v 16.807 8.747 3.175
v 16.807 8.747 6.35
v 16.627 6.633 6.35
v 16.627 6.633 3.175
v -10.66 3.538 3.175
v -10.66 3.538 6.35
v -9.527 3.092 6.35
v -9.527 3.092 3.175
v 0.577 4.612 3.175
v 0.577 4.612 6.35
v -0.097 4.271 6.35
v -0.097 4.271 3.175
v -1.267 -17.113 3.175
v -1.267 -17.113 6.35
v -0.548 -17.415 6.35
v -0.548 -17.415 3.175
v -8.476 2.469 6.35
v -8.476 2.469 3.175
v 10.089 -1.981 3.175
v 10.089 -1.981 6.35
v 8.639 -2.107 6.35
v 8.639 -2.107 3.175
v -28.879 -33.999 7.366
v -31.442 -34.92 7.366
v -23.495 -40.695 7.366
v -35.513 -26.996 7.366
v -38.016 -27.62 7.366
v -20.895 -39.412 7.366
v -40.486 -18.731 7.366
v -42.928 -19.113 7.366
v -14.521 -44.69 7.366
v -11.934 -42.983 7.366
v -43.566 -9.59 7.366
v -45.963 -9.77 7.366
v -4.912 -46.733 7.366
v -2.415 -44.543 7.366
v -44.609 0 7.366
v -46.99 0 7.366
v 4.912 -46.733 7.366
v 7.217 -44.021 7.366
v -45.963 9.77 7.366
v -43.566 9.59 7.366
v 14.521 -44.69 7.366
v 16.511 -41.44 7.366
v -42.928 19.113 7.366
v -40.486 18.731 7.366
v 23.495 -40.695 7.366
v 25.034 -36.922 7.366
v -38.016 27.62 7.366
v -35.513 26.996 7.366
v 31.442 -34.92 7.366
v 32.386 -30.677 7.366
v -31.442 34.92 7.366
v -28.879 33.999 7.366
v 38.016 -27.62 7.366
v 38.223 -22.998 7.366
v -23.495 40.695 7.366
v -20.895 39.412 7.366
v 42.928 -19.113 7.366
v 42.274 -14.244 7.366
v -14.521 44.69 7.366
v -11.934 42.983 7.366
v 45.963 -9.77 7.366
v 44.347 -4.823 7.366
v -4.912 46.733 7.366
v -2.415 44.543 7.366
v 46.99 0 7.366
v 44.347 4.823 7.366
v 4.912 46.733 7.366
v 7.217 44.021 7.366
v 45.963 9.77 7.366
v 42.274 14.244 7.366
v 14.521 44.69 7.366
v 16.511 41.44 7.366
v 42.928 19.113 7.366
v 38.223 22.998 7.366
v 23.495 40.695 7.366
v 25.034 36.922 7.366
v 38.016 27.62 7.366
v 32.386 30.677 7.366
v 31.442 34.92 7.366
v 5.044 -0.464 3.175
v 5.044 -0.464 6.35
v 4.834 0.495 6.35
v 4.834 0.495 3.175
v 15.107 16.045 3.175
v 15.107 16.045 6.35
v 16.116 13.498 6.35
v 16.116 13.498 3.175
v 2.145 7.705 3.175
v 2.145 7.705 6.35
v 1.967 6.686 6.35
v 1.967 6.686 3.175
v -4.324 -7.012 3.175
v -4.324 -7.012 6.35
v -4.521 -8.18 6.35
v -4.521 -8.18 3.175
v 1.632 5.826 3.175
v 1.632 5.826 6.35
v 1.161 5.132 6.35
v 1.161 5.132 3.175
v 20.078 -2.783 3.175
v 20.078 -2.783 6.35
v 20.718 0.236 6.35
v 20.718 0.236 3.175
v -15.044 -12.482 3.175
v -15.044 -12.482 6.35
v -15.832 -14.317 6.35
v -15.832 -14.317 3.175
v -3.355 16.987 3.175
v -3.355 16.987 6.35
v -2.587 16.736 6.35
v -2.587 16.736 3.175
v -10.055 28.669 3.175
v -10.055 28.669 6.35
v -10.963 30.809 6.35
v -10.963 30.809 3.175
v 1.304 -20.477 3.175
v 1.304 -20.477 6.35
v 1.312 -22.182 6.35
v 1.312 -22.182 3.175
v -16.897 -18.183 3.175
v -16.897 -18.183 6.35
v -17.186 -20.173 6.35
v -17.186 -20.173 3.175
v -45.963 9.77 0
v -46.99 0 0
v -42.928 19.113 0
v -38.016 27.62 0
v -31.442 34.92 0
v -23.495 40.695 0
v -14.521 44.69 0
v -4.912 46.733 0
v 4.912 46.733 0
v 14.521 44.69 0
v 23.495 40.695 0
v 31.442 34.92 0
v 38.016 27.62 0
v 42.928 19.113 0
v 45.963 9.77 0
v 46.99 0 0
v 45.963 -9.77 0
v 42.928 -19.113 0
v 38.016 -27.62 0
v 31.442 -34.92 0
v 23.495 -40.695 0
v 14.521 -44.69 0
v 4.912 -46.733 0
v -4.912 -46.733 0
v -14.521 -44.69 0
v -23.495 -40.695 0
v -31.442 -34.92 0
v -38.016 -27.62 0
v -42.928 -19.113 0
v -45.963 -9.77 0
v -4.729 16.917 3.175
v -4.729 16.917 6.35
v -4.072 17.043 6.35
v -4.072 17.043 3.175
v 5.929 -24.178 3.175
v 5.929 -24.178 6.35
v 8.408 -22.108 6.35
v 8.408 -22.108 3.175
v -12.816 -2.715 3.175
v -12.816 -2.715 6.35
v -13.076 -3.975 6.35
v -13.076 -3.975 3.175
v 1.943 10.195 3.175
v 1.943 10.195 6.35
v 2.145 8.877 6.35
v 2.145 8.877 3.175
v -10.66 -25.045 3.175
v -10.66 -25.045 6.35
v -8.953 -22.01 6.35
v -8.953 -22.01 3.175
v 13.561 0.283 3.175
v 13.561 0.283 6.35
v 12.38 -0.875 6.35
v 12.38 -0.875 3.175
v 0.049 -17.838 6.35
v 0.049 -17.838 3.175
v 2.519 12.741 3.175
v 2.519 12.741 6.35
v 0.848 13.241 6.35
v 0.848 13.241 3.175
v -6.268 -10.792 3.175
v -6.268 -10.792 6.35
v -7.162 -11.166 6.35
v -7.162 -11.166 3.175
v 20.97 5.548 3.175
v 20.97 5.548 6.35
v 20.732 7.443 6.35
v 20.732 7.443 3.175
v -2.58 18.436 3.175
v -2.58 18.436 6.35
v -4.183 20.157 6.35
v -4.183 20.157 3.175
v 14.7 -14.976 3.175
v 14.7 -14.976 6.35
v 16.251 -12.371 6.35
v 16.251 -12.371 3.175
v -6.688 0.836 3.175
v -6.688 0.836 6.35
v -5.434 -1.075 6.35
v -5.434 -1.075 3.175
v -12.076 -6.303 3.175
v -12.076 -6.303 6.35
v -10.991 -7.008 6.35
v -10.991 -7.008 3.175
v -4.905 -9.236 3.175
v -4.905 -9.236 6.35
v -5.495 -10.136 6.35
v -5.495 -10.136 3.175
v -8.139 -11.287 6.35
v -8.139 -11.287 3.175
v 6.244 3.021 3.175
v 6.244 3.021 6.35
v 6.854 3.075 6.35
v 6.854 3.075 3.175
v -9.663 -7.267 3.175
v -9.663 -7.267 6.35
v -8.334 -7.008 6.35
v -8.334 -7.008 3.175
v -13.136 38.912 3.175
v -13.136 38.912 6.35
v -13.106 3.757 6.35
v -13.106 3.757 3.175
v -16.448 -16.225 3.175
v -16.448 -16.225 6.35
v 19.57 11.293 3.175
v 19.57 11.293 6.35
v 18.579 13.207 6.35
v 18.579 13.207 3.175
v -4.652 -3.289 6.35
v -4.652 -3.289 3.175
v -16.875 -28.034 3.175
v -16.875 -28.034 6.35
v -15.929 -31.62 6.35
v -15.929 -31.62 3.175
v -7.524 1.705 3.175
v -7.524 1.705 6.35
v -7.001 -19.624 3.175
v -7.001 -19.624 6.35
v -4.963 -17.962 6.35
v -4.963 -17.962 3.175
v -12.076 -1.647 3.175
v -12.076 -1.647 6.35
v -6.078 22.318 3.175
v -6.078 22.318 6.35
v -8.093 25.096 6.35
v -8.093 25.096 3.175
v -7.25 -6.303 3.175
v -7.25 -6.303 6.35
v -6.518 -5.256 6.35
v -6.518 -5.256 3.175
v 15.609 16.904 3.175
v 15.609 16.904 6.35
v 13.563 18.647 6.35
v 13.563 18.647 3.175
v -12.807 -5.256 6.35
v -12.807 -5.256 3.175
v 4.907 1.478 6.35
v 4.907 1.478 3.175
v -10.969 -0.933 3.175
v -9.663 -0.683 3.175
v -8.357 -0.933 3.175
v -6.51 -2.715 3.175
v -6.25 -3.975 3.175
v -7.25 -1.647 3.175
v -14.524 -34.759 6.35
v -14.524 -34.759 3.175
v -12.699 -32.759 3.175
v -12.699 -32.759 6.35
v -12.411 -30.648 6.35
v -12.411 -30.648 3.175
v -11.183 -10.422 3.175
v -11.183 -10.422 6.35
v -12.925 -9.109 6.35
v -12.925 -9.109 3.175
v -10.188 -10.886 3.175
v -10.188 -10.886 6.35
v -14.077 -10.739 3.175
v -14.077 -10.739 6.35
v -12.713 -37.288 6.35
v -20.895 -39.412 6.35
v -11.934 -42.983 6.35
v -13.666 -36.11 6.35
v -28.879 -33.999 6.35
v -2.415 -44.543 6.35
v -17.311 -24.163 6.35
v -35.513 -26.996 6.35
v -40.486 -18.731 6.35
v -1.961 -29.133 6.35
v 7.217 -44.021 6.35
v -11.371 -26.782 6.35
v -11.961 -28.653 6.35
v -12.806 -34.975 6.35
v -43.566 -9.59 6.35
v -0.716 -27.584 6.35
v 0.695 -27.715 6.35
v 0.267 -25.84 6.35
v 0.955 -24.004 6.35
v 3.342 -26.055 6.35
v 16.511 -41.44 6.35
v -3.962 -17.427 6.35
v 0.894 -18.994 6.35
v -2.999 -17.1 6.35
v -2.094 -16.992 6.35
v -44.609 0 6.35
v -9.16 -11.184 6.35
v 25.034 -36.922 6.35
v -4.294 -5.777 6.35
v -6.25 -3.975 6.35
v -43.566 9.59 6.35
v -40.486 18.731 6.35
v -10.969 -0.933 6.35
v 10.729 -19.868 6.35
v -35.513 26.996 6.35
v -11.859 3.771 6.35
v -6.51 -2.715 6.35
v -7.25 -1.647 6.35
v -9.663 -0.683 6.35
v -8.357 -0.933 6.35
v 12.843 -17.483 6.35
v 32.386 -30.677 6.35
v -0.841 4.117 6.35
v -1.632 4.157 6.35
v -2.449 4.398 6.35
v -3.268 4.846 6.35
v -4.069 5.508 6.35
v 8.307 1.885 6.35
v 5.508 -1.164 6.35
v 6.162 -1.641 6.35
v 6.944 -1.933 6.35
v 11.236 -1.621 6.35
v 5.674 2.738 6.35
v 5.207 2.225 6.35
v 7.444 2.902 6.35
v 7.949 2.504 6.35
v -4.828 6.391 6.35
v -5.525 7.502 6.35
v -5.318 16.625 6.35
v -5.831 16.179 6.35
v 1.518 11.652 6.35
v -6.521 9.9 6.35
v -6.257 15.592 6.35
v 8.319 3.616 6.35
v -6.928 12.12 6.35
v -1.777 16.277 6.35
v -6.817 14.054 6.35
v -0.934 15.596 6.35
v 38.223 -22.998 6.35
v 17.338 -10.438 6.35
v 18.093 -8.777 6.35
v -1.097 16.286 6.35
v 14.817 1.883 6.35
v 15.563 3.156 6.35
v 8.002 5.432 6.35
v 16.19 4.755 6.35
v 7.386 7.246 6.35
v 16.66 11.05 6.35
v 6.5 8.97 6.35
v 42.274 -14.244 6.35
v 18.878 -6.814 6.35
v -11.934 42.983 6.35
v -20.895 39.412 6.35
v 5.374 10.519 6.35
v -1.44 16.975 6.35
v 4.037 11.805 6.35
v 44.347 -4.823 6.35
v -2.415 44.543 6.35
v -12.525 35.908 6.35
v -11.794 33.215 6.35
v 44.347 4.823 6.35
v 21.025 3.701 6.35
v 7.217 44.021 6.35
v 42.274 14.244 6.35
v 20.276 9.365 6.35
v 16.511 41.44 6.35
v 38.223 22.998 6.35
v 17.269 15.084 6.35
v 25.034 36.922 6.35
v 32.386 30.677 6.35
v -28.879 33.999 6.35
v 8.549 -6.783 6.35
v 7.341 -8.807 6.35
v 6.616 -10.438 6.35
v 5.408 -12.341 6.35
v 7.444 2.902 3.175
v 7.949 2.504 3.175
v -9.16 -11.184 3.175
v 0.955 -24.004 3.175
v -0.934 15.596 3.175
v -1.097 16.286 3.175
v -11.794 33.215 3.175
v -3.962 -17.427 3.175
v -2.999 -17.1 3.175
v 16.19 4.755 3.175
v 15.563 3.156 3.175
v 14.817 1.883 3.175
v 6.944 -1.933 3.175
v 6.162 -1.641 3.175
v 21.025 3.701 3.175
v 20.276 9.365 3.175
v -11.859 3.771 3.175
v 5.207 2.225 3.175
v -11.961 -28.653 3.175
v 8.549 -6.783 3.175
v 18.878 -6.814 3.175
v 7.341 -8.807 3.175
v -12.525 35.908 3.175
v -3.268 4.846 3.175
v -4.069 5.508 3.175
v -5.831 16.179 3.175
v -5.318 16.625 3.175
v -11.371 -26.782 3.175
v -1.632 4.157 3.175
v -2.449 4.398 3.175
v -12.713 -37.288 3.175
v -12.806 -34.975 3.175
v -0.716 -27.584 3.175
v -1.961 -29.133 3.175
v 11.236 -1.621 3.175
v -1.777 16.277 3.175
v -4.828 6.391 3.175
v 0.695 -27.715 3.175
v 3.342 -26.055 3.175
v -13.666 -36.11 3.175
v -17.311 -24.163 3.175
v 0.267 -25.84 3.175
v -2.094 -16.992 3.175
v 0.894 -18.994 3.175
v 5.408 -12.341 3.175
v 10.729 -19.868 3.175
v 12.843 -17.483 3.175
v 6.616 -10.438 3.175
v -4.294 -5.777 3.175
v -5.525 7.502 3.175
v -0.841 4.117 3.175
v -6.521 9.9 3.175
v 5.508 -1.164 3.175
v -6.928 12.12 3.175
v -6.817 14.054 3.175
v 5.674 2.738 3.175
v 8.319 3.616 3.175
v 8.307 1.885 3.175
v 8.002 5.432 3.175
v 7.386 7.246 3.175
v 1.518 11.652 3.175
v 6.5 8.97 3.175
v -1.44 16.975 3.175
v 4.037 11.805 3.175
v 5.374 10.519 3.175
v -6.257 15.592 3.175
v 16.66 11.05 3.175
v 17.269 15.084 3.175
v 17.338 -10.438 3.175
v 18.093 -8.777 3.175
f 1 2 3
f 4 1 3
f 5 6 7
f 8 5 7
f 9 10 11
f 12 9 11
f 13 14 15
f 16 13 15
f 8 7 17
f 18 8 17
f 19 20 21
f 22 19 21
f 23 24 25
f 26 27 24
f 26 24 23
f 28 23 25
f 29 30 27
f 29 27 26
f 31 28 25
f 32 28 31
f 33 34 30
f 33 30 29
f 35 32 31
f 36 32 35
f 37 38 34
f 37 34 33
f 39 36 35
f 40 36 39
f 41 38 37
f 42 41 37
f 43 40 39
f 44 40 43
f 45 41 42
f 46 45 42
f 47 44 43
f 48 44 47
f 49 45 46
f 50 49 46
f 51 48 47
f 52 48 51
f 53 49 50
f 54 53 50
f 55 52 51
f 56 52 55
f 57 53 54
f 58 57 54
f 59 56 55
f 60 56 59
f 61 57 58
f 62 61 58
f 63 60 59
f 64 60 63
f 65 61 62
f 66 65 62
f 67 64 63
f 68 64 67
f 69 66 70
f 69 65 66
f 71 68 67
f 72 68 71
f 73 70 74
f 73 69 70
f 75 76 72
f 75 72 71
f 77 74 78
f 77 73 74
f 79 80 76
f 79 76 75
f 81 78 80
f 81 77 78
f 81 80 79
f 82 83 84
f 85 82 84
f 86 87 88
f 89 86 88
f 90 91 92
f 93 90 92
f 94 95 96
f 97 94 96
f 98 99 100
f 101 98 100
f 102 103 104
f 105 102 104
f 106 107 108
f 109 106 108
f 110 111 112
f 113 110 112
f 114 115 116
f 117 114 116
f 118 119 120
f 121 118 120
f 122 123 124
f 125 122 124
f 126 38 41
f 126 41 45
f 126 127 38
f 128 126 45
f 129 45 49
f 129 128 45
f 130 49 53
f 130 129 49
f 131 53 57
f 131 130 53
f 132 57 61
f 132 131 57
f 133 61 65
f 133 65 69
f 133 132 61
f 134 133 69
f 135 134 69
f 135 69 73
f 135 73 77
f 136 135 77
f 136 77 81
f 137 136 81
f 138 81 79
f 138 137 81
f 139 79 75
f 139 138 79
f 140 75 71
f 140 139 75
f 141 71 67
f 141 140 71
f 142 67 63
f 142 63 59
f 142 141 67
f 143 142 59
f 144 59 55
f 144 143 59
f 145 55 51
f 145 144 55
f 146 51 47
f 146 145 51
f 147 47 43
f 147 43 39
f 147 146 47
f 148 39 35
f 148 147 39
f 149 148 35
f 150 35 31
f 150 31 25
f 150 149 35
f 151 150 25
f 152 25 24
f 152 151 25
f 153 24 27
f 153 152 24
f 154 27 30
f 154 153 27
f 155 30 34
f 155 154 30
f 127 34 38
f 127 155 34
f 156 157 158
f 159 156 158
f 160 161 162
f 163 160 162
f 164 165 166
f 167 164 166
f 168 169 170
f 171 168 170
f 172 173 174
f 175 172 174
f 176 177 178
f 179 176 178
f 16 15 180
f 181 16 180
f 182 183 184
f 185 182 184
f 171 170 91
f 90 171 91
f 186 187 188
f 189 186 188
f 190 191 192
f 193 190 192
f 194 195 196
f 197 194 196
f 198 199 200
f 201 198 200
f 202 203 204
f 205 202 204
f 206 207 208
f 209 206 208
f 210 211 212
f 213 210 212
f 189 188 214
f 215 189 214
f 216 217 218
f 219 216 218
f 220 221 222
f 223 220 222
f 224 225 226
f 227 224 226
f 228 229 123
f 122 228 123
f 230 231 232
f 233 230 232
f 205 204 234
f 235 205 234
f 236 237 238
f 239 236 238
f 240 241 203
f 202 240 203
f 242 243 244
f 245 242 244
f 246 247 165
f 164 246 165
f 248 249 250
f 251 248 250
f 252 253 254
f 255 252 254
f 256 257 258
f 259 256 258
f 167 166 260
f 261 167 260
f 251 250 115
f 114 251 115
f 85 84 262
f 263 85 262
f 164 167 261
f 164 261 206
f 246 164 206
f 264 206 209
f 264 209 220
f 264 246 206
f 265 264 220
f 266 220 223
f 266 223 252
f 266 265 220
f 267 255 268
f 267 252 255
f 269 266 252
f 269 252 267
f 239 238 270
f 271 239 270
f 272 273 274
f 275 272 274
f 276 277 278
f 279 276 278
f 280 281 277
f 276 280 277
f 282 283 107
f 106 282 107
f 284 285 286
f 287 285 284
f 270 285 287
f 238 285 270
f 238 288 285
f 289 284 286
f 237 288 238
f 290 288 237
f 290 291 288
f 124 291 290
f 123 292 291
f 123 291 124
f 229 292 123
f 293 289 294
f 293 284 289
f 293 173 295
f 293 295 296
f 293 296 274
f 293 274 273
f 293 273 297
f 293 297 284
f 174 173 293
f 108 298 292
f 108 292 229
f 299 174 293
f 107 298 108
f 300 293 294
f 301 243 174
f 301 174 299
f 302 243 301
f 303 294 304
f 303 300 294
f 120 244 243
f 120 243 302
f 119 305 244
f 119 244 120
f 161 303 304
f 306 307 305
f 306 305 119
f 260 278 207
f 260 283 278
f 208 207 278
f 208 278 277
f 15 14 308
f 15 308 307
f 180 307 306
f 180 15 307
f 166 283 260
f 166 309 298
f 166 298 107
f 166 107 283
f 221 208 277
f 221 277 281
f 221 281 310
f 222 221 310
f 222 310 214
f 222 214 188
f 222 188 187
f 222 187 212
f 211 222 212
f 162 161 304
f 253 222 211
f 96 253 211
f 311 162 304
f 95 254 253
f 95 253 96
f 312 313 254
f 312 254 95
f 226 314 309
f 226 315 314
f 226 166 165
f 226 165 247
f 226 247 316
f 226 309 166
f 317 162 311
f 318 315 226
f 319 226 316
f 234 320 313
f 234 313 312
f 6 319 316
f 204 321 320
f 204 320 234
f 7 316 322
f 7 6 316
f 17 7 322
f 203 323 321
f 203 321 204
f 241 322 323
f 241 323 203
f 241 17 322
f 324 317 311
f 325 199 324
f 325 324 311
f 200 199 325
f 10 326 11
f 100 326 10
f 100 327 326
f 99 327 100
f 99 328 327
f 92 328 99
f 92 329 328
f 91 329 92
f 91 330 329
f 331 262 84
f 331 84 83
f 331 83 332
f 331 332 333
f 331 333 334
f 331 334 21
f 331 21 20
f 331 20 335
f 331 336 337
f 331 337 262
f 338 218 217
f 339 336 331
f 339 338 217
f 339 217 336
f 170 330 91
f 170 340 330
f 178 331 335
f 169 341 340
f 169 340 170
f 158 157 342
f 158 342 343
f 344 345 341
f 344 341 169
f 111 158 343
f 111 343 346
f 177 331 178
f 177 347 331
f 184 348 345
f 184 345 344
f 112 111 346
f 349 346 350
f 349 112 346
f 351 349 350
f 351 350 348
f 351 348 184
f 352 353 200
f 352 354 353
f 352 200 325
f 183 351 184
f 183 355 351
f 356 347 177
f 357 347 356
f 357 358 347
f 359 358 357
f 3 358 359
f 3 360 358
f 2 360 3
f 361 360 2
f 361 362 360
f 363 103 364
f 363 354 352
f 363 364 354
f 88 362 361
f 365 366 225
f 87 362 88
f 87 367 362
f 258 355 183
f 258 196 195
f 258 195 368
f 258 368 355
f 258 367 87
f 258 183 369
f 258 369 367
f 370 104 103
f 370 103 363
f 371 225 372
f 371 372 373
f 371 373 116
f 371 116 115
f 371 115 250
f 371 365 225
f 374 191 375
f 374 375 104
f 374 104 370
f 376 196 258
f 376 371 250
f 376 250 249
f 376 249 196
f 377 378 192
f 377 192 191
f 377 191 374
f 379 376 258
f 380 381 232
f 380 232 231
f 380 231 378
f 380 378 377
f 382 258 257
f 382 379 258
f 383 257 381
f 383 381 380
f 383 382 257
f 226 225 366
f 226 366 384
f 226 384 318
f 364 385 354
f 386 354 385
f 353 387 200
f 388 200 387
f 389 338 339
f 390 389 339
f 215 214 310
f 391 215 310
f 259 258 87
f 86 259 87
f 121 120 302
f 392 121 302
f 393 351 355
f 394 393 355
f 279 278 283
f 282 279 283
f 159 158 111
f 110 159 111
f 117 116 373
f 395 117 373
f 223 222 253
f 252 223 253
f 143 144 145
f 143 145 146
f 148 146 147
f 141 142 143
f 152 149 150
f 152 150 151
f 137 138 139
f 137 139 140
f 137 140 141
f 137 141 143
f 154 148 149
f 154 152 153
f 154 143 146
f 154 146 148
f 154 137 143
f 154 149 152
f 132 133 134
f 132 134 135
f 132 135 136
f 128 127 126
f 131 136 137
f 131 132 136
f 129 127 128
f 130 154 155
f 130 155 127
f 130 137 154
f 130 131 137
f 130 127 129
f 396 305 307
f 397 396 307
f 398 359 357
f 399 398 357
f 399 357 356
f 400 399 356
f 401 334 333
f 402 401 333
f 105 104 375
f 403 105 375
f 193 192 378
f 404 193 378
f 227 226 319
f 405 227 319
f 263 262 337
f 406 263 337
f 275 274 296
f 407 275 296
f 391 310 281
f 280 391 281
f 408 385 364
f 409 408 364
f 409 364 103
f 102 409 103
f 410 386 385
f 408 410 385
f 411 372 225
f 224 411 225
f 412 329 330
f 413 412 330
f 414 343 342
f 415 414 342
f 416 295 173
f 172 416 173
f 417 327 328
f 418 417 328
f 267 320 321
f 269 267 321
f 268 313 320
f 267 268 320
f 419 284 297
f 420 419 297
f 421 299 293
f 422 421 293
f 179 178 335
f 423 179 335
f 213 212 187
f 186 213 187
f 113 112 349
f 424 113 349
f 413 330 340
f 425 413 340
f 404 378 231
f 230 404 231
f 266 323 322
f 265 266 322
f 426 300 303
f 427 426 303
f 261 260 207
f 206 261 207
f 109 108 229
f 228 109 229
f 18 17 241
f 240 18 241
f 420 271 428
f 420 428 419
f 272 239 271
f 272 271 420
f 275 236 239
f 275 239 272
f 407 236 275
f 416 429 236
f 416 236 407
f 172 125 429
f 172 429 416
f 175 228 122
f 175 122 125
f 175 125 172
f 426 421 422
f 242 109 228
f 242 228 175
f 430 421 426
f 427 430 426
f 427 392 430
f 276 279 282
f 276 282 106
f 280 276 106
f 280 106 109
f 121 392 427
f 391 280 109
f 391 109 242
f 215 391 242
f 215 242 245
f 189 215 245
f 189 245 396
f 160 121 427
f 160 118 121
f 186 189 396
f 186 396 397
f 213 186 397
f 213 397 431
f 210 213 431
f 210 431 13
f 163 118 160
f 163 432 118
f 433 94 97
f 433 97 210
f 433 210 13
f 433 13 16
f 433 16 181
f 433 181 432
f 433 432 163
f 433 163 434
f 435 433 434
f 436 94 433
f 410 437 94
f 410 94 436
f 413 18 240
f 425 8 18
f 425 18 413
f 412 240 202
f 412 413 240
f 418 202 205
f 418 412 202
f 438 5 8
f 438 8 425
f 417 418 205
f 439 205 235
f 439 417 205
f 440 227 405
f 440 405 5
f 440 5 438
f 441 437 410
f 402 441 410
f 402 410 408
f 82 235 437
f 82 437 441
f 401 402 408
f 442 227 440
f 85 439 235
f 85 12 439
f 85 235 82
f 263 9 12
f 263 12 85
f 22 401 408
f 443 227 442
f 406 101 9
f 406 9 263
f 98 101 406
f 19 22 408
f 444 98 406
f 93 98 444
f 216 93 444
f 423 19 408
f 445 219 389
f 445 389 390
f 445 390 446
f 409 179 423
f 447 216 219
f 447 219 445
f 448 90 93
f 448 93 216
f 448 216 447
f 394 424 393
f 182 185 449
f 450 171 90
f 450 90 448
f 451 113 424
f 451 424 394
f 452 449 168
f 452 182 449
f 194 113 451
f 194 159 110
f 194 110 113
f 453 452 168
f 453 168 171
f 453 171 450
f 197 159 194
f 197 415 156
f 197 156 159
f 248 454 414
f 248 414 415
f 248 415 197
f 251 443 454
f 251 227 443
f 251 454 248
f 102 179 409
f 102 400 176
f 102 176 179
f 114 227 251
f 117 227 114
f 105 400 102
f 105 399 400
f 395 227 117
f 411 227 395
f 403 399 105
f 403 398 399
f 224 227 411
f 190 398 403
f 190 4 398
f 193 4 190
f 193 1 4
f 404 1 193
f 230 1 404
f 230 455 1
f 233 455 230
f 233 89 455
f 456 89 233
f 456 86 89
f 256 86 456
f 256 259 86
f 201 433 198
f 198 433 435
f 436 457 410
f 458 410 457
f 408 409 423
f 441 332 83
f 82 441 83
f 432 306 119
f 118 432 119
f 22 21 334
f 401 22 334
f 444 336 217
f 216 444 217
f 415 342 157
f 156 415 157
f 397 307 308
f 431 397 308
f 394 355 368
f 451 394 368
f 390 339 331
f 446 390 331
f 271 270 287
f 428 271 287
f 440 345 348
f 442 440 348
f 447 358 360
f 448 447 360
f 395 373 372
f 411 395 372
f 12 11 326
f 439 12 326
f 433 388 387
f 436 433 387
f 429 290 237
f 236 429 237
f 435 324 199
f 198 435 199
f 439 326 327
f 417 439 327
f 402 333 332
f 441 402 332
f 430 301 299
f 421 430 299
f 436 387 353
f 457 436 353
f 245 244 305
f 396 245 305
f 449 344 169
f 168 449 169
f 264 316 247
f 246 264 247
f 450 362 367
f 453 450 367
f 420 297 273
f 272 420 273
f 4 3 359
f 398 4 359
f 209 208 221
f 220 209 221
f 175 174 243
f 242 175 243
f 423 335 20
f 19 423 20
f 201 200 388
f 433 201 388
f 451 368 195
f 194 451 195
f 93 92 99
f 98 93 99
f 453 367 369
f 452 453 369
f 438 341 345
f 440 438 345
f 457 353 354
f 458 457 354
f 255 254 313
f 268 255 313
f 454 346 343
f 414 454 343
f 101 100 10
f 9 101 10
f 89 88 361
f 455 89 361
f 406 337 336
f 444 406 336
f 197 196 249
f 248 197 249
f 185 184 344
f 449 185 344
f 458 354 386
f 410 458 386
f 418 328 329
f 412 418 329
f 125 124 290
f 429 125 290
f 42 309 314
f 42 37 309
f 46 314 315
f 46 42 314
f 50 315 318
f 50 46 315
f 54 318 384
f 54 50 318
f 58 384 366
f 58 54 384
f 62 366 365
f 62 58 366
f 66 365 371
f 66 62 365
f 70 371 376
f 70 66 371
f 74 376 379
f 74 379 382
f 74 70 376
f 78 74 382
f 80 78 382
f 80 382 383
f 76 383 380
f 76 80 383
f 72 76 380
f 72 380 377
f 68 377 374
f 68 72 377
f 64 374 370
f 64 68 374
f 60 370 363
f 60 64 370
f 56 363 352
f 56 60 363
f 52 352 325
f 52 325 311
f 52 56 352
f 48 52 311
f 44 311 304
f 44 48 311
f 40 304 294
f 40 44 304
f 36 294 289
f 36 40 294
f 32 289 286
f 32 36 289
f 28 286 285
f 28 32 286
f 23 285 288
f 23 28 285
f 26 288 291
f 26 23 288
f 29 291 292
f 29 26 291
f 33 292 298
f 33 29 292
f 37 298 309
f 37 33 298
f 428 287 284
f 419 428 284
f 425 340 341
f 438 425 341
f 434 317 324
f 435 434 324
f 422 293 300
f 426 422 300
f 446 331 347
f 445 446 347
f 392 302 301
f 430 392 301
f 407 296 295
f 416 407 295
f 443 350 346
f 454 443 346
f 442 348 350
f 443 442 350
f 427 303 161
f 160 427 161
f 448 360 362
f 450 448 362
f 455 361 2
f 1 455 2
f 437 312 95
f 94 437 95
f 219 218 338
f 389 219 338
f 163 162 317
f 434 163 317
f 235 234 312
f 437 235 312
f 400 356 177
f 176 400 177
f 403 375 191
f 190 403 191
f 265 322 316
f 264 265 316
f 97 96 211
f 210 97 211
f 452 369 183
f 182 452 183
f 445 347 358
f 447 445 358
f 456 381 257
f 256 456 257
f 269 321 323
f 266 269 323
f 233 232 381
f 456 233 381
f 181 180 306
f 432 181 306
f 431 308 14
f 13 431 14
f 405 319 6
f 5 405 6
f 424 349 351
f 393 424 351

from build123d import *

# Parameters (mm, degrees)
F3_DEPTH = 3.175


with BuildPart() as f1:
    # F0 (on Front) → F1 (revolve)
    with BuildSketch(Plane.XZ):
        Polygon((-44.60875, 7.366), (-46.99, 7.366), (-46.99, 0), (0, 0), (0, 6.35), (-44.60875, 6.35), align=None)
    revolve(axis=Axis((0, 0, 3.175), (0, 0, -1)))

    # F2 (on face) → F3 (cut)
    with BuildSketch(Plane.XY.offset(6.35)):
        Polygon((-13.136034, 38.912354), (-13.105828, 3.757066), (-11.859001, 3.771245), (-10.660359, 3.537526), (-9.526933, 3.091542), (-8.475764, 2.468926), (-7.523901, 1.705309), (-6.688365, 0.836315), (-5.434484, -1.075276), (-4.651632, -3.288853), (-4.293584, -5.777134), (-4.324106, -7.01164), (-4.521094, -8.179643), (-4.904661, -9.236092), (-5.494886, -10.135925), (-6.268279, -10.791905), (-7.162464, -11.166064), (-8.139243, -11.287278), (-9.160387, -11.184392), (-10.187706, -10.886271), (-11.182993, -10.421768), (-12.924614, -9.109049), (-14.077223, -10.739327), (-15.044289, -12.482277), (-15.832252, -14.317493), (-16.447562, -16.224576), (-16.896672, -18.183107), (-17.186041, -20.17271), (-17.311352, -24.163445), (-16.875112, -28.033535), (-15.92893, -31.619757), (-14.524421, -34.758876), (-13.666418, -36.109751), (-12.713203, -37.287646), (-12.806471, -34.975058), (-12.698982, -32.758747), (-12.410626, -30.64813), (-11.961338, -28.652615), (-11.371018, -26.781629), (-10.65961, -25.04458), (-8.953136, -22.009984), (-7.001257, -19.624146), (-4.963309, -17.962417), (-3.961857, -17.426638), (-2.998644, -17.100127), (-2.093584, -16.99232), (-1.266589, -17.112616), (-0.547738, -17.414856), (0.049097, -17.837887), (0.894188, -18.994107), (1.303621, -20.476849), (1.312331, -22.181665), (0.955265, -24.004137), (0.267348, -25.839818), (-0.716463, -27.584268), (-1.961242, -29.13307), (0.694919, -27.714731), (3.341536, -26.055124), (5.929156, -24.178162), (8.408294, -22.107803), (10.729487, -19.867958), (12.84326, -17.482574), (14.70014, -14.975573), (16.250653, -12.370882), (5.408085, -12.340676), (6.616165, -10.437943), (17.337931, -10.437943), (18.092985, -8.776826), (7.341023, -8.807032), (8.549104, -6.783486), (18.878235, -6.813692), (20.078154, -2.783312), (20.717557, 0.236366), (21.025033, 3.701278), (20.970354, 5.548097), (20.731948, 7.443102), (20.27624, 9.36524), (19.569635, 11.293491), (18.57855, 13.206803), (17.269421, 15.084145), (15.608653, 16.904463), (13.56266, 18.646717), (15.106564, 16.045076), (16.115819, 13.497777), (16.659601, 11.049964), (16.807072, 8.746751), (16.627389, 6.633274), (16.189703, 4.754655), (15.563201, 3.15604), (14.817037, 1.882544), (13.560792, 0.283274), (12.379845, -0.875078), (11.235587, -1.620599), (10.089418, -1.981339), (8.639236, -2.107231), (6.944323, -1.932942), (6.162442, -1.641123), (5.508173, -1.163719), (5.044462, -0.463882), (4.834245, 0.495234), (4.906693, 1.477767), (5.207401, 2.224786), (5.673899, 2.738488), (6.243748, 3.02109), (6.854487, 3.074787), (7.443656, 2.901786), (7.948806, 2.504294), (8.307488, 1.884528), (8.318795, 3.616362), (8.001849, 5.432468), (7.385926, 7.246082), (6.500356, 8.970472), (5.374426, 10.518863), (4.037456, 11.804512), (2.518732, 12.740654), (0.847564, 13.240535), (1.51767, 11.651856), (1.942676, 10.195223), (2.144573, 8.877468), (2.145376, 7.705464), (1.967064, 6.686042), (1.631632, 5.826053), (1.161079, 5.132351), (0.5774, 4.611786), (-0.097415, 4.271211), (-0.841351, 4.117468), (-1.632439, 4.157409), (-2.448655, 4.397884), (-3.268038, 4.845748), (-4.068565, 5.50784), (-4.828243, 6.391013), (-5.525092, 7.502131), (-6.521002, 9.899941), (-6.928186, 12.120486), (-6.816748, 14.054397), (-6.256802, 15.592293), (-5.830562, 16.178549), (-5.318485, 16.624797), (-4.729337, 16.917354), (-4.07189, 17.042549), (-3.354908, 16.986719), (-2.587142, 16.736182), (-1.777377, 16.277264), (-0.934366, 15.596305), (-1.09684, 16.28627), (-1.439569, 16.97463), (-2.579857, 18.435592), (-4.183413, 20.157332), (-6.078396, 22.317982), (-8.092979, 25.095675), (-10.055332, 28.668541), (-10.963232, 30.808836), (-11.793627, 33.214723), (-12.525052, 35.90847), align=None)
        Polygon((-6.518141, -5.256094), (-6.24994, -3.97469), (-6.509726, -2.714876), (-7.249545, -1.646867), (-8.356745, -0.933242), (-9.662781, -0.682651), (-10.968817, -0.933242), (-12.076028, -1.646867), (-12.815836, -2.714876), (-13.075622, -3.97469), (-12.807422, -5.256094), (-12.076028, -6.302502), (-10.99121, -7.008008), (-9.662781, -7.266718), (-8.334352, -7.008008), (-7.249545, -6.302502), align=None)
    extrude(amount=-F3_DEPTH, mode=Mode.SUBTRACT)


solid = f1.part
